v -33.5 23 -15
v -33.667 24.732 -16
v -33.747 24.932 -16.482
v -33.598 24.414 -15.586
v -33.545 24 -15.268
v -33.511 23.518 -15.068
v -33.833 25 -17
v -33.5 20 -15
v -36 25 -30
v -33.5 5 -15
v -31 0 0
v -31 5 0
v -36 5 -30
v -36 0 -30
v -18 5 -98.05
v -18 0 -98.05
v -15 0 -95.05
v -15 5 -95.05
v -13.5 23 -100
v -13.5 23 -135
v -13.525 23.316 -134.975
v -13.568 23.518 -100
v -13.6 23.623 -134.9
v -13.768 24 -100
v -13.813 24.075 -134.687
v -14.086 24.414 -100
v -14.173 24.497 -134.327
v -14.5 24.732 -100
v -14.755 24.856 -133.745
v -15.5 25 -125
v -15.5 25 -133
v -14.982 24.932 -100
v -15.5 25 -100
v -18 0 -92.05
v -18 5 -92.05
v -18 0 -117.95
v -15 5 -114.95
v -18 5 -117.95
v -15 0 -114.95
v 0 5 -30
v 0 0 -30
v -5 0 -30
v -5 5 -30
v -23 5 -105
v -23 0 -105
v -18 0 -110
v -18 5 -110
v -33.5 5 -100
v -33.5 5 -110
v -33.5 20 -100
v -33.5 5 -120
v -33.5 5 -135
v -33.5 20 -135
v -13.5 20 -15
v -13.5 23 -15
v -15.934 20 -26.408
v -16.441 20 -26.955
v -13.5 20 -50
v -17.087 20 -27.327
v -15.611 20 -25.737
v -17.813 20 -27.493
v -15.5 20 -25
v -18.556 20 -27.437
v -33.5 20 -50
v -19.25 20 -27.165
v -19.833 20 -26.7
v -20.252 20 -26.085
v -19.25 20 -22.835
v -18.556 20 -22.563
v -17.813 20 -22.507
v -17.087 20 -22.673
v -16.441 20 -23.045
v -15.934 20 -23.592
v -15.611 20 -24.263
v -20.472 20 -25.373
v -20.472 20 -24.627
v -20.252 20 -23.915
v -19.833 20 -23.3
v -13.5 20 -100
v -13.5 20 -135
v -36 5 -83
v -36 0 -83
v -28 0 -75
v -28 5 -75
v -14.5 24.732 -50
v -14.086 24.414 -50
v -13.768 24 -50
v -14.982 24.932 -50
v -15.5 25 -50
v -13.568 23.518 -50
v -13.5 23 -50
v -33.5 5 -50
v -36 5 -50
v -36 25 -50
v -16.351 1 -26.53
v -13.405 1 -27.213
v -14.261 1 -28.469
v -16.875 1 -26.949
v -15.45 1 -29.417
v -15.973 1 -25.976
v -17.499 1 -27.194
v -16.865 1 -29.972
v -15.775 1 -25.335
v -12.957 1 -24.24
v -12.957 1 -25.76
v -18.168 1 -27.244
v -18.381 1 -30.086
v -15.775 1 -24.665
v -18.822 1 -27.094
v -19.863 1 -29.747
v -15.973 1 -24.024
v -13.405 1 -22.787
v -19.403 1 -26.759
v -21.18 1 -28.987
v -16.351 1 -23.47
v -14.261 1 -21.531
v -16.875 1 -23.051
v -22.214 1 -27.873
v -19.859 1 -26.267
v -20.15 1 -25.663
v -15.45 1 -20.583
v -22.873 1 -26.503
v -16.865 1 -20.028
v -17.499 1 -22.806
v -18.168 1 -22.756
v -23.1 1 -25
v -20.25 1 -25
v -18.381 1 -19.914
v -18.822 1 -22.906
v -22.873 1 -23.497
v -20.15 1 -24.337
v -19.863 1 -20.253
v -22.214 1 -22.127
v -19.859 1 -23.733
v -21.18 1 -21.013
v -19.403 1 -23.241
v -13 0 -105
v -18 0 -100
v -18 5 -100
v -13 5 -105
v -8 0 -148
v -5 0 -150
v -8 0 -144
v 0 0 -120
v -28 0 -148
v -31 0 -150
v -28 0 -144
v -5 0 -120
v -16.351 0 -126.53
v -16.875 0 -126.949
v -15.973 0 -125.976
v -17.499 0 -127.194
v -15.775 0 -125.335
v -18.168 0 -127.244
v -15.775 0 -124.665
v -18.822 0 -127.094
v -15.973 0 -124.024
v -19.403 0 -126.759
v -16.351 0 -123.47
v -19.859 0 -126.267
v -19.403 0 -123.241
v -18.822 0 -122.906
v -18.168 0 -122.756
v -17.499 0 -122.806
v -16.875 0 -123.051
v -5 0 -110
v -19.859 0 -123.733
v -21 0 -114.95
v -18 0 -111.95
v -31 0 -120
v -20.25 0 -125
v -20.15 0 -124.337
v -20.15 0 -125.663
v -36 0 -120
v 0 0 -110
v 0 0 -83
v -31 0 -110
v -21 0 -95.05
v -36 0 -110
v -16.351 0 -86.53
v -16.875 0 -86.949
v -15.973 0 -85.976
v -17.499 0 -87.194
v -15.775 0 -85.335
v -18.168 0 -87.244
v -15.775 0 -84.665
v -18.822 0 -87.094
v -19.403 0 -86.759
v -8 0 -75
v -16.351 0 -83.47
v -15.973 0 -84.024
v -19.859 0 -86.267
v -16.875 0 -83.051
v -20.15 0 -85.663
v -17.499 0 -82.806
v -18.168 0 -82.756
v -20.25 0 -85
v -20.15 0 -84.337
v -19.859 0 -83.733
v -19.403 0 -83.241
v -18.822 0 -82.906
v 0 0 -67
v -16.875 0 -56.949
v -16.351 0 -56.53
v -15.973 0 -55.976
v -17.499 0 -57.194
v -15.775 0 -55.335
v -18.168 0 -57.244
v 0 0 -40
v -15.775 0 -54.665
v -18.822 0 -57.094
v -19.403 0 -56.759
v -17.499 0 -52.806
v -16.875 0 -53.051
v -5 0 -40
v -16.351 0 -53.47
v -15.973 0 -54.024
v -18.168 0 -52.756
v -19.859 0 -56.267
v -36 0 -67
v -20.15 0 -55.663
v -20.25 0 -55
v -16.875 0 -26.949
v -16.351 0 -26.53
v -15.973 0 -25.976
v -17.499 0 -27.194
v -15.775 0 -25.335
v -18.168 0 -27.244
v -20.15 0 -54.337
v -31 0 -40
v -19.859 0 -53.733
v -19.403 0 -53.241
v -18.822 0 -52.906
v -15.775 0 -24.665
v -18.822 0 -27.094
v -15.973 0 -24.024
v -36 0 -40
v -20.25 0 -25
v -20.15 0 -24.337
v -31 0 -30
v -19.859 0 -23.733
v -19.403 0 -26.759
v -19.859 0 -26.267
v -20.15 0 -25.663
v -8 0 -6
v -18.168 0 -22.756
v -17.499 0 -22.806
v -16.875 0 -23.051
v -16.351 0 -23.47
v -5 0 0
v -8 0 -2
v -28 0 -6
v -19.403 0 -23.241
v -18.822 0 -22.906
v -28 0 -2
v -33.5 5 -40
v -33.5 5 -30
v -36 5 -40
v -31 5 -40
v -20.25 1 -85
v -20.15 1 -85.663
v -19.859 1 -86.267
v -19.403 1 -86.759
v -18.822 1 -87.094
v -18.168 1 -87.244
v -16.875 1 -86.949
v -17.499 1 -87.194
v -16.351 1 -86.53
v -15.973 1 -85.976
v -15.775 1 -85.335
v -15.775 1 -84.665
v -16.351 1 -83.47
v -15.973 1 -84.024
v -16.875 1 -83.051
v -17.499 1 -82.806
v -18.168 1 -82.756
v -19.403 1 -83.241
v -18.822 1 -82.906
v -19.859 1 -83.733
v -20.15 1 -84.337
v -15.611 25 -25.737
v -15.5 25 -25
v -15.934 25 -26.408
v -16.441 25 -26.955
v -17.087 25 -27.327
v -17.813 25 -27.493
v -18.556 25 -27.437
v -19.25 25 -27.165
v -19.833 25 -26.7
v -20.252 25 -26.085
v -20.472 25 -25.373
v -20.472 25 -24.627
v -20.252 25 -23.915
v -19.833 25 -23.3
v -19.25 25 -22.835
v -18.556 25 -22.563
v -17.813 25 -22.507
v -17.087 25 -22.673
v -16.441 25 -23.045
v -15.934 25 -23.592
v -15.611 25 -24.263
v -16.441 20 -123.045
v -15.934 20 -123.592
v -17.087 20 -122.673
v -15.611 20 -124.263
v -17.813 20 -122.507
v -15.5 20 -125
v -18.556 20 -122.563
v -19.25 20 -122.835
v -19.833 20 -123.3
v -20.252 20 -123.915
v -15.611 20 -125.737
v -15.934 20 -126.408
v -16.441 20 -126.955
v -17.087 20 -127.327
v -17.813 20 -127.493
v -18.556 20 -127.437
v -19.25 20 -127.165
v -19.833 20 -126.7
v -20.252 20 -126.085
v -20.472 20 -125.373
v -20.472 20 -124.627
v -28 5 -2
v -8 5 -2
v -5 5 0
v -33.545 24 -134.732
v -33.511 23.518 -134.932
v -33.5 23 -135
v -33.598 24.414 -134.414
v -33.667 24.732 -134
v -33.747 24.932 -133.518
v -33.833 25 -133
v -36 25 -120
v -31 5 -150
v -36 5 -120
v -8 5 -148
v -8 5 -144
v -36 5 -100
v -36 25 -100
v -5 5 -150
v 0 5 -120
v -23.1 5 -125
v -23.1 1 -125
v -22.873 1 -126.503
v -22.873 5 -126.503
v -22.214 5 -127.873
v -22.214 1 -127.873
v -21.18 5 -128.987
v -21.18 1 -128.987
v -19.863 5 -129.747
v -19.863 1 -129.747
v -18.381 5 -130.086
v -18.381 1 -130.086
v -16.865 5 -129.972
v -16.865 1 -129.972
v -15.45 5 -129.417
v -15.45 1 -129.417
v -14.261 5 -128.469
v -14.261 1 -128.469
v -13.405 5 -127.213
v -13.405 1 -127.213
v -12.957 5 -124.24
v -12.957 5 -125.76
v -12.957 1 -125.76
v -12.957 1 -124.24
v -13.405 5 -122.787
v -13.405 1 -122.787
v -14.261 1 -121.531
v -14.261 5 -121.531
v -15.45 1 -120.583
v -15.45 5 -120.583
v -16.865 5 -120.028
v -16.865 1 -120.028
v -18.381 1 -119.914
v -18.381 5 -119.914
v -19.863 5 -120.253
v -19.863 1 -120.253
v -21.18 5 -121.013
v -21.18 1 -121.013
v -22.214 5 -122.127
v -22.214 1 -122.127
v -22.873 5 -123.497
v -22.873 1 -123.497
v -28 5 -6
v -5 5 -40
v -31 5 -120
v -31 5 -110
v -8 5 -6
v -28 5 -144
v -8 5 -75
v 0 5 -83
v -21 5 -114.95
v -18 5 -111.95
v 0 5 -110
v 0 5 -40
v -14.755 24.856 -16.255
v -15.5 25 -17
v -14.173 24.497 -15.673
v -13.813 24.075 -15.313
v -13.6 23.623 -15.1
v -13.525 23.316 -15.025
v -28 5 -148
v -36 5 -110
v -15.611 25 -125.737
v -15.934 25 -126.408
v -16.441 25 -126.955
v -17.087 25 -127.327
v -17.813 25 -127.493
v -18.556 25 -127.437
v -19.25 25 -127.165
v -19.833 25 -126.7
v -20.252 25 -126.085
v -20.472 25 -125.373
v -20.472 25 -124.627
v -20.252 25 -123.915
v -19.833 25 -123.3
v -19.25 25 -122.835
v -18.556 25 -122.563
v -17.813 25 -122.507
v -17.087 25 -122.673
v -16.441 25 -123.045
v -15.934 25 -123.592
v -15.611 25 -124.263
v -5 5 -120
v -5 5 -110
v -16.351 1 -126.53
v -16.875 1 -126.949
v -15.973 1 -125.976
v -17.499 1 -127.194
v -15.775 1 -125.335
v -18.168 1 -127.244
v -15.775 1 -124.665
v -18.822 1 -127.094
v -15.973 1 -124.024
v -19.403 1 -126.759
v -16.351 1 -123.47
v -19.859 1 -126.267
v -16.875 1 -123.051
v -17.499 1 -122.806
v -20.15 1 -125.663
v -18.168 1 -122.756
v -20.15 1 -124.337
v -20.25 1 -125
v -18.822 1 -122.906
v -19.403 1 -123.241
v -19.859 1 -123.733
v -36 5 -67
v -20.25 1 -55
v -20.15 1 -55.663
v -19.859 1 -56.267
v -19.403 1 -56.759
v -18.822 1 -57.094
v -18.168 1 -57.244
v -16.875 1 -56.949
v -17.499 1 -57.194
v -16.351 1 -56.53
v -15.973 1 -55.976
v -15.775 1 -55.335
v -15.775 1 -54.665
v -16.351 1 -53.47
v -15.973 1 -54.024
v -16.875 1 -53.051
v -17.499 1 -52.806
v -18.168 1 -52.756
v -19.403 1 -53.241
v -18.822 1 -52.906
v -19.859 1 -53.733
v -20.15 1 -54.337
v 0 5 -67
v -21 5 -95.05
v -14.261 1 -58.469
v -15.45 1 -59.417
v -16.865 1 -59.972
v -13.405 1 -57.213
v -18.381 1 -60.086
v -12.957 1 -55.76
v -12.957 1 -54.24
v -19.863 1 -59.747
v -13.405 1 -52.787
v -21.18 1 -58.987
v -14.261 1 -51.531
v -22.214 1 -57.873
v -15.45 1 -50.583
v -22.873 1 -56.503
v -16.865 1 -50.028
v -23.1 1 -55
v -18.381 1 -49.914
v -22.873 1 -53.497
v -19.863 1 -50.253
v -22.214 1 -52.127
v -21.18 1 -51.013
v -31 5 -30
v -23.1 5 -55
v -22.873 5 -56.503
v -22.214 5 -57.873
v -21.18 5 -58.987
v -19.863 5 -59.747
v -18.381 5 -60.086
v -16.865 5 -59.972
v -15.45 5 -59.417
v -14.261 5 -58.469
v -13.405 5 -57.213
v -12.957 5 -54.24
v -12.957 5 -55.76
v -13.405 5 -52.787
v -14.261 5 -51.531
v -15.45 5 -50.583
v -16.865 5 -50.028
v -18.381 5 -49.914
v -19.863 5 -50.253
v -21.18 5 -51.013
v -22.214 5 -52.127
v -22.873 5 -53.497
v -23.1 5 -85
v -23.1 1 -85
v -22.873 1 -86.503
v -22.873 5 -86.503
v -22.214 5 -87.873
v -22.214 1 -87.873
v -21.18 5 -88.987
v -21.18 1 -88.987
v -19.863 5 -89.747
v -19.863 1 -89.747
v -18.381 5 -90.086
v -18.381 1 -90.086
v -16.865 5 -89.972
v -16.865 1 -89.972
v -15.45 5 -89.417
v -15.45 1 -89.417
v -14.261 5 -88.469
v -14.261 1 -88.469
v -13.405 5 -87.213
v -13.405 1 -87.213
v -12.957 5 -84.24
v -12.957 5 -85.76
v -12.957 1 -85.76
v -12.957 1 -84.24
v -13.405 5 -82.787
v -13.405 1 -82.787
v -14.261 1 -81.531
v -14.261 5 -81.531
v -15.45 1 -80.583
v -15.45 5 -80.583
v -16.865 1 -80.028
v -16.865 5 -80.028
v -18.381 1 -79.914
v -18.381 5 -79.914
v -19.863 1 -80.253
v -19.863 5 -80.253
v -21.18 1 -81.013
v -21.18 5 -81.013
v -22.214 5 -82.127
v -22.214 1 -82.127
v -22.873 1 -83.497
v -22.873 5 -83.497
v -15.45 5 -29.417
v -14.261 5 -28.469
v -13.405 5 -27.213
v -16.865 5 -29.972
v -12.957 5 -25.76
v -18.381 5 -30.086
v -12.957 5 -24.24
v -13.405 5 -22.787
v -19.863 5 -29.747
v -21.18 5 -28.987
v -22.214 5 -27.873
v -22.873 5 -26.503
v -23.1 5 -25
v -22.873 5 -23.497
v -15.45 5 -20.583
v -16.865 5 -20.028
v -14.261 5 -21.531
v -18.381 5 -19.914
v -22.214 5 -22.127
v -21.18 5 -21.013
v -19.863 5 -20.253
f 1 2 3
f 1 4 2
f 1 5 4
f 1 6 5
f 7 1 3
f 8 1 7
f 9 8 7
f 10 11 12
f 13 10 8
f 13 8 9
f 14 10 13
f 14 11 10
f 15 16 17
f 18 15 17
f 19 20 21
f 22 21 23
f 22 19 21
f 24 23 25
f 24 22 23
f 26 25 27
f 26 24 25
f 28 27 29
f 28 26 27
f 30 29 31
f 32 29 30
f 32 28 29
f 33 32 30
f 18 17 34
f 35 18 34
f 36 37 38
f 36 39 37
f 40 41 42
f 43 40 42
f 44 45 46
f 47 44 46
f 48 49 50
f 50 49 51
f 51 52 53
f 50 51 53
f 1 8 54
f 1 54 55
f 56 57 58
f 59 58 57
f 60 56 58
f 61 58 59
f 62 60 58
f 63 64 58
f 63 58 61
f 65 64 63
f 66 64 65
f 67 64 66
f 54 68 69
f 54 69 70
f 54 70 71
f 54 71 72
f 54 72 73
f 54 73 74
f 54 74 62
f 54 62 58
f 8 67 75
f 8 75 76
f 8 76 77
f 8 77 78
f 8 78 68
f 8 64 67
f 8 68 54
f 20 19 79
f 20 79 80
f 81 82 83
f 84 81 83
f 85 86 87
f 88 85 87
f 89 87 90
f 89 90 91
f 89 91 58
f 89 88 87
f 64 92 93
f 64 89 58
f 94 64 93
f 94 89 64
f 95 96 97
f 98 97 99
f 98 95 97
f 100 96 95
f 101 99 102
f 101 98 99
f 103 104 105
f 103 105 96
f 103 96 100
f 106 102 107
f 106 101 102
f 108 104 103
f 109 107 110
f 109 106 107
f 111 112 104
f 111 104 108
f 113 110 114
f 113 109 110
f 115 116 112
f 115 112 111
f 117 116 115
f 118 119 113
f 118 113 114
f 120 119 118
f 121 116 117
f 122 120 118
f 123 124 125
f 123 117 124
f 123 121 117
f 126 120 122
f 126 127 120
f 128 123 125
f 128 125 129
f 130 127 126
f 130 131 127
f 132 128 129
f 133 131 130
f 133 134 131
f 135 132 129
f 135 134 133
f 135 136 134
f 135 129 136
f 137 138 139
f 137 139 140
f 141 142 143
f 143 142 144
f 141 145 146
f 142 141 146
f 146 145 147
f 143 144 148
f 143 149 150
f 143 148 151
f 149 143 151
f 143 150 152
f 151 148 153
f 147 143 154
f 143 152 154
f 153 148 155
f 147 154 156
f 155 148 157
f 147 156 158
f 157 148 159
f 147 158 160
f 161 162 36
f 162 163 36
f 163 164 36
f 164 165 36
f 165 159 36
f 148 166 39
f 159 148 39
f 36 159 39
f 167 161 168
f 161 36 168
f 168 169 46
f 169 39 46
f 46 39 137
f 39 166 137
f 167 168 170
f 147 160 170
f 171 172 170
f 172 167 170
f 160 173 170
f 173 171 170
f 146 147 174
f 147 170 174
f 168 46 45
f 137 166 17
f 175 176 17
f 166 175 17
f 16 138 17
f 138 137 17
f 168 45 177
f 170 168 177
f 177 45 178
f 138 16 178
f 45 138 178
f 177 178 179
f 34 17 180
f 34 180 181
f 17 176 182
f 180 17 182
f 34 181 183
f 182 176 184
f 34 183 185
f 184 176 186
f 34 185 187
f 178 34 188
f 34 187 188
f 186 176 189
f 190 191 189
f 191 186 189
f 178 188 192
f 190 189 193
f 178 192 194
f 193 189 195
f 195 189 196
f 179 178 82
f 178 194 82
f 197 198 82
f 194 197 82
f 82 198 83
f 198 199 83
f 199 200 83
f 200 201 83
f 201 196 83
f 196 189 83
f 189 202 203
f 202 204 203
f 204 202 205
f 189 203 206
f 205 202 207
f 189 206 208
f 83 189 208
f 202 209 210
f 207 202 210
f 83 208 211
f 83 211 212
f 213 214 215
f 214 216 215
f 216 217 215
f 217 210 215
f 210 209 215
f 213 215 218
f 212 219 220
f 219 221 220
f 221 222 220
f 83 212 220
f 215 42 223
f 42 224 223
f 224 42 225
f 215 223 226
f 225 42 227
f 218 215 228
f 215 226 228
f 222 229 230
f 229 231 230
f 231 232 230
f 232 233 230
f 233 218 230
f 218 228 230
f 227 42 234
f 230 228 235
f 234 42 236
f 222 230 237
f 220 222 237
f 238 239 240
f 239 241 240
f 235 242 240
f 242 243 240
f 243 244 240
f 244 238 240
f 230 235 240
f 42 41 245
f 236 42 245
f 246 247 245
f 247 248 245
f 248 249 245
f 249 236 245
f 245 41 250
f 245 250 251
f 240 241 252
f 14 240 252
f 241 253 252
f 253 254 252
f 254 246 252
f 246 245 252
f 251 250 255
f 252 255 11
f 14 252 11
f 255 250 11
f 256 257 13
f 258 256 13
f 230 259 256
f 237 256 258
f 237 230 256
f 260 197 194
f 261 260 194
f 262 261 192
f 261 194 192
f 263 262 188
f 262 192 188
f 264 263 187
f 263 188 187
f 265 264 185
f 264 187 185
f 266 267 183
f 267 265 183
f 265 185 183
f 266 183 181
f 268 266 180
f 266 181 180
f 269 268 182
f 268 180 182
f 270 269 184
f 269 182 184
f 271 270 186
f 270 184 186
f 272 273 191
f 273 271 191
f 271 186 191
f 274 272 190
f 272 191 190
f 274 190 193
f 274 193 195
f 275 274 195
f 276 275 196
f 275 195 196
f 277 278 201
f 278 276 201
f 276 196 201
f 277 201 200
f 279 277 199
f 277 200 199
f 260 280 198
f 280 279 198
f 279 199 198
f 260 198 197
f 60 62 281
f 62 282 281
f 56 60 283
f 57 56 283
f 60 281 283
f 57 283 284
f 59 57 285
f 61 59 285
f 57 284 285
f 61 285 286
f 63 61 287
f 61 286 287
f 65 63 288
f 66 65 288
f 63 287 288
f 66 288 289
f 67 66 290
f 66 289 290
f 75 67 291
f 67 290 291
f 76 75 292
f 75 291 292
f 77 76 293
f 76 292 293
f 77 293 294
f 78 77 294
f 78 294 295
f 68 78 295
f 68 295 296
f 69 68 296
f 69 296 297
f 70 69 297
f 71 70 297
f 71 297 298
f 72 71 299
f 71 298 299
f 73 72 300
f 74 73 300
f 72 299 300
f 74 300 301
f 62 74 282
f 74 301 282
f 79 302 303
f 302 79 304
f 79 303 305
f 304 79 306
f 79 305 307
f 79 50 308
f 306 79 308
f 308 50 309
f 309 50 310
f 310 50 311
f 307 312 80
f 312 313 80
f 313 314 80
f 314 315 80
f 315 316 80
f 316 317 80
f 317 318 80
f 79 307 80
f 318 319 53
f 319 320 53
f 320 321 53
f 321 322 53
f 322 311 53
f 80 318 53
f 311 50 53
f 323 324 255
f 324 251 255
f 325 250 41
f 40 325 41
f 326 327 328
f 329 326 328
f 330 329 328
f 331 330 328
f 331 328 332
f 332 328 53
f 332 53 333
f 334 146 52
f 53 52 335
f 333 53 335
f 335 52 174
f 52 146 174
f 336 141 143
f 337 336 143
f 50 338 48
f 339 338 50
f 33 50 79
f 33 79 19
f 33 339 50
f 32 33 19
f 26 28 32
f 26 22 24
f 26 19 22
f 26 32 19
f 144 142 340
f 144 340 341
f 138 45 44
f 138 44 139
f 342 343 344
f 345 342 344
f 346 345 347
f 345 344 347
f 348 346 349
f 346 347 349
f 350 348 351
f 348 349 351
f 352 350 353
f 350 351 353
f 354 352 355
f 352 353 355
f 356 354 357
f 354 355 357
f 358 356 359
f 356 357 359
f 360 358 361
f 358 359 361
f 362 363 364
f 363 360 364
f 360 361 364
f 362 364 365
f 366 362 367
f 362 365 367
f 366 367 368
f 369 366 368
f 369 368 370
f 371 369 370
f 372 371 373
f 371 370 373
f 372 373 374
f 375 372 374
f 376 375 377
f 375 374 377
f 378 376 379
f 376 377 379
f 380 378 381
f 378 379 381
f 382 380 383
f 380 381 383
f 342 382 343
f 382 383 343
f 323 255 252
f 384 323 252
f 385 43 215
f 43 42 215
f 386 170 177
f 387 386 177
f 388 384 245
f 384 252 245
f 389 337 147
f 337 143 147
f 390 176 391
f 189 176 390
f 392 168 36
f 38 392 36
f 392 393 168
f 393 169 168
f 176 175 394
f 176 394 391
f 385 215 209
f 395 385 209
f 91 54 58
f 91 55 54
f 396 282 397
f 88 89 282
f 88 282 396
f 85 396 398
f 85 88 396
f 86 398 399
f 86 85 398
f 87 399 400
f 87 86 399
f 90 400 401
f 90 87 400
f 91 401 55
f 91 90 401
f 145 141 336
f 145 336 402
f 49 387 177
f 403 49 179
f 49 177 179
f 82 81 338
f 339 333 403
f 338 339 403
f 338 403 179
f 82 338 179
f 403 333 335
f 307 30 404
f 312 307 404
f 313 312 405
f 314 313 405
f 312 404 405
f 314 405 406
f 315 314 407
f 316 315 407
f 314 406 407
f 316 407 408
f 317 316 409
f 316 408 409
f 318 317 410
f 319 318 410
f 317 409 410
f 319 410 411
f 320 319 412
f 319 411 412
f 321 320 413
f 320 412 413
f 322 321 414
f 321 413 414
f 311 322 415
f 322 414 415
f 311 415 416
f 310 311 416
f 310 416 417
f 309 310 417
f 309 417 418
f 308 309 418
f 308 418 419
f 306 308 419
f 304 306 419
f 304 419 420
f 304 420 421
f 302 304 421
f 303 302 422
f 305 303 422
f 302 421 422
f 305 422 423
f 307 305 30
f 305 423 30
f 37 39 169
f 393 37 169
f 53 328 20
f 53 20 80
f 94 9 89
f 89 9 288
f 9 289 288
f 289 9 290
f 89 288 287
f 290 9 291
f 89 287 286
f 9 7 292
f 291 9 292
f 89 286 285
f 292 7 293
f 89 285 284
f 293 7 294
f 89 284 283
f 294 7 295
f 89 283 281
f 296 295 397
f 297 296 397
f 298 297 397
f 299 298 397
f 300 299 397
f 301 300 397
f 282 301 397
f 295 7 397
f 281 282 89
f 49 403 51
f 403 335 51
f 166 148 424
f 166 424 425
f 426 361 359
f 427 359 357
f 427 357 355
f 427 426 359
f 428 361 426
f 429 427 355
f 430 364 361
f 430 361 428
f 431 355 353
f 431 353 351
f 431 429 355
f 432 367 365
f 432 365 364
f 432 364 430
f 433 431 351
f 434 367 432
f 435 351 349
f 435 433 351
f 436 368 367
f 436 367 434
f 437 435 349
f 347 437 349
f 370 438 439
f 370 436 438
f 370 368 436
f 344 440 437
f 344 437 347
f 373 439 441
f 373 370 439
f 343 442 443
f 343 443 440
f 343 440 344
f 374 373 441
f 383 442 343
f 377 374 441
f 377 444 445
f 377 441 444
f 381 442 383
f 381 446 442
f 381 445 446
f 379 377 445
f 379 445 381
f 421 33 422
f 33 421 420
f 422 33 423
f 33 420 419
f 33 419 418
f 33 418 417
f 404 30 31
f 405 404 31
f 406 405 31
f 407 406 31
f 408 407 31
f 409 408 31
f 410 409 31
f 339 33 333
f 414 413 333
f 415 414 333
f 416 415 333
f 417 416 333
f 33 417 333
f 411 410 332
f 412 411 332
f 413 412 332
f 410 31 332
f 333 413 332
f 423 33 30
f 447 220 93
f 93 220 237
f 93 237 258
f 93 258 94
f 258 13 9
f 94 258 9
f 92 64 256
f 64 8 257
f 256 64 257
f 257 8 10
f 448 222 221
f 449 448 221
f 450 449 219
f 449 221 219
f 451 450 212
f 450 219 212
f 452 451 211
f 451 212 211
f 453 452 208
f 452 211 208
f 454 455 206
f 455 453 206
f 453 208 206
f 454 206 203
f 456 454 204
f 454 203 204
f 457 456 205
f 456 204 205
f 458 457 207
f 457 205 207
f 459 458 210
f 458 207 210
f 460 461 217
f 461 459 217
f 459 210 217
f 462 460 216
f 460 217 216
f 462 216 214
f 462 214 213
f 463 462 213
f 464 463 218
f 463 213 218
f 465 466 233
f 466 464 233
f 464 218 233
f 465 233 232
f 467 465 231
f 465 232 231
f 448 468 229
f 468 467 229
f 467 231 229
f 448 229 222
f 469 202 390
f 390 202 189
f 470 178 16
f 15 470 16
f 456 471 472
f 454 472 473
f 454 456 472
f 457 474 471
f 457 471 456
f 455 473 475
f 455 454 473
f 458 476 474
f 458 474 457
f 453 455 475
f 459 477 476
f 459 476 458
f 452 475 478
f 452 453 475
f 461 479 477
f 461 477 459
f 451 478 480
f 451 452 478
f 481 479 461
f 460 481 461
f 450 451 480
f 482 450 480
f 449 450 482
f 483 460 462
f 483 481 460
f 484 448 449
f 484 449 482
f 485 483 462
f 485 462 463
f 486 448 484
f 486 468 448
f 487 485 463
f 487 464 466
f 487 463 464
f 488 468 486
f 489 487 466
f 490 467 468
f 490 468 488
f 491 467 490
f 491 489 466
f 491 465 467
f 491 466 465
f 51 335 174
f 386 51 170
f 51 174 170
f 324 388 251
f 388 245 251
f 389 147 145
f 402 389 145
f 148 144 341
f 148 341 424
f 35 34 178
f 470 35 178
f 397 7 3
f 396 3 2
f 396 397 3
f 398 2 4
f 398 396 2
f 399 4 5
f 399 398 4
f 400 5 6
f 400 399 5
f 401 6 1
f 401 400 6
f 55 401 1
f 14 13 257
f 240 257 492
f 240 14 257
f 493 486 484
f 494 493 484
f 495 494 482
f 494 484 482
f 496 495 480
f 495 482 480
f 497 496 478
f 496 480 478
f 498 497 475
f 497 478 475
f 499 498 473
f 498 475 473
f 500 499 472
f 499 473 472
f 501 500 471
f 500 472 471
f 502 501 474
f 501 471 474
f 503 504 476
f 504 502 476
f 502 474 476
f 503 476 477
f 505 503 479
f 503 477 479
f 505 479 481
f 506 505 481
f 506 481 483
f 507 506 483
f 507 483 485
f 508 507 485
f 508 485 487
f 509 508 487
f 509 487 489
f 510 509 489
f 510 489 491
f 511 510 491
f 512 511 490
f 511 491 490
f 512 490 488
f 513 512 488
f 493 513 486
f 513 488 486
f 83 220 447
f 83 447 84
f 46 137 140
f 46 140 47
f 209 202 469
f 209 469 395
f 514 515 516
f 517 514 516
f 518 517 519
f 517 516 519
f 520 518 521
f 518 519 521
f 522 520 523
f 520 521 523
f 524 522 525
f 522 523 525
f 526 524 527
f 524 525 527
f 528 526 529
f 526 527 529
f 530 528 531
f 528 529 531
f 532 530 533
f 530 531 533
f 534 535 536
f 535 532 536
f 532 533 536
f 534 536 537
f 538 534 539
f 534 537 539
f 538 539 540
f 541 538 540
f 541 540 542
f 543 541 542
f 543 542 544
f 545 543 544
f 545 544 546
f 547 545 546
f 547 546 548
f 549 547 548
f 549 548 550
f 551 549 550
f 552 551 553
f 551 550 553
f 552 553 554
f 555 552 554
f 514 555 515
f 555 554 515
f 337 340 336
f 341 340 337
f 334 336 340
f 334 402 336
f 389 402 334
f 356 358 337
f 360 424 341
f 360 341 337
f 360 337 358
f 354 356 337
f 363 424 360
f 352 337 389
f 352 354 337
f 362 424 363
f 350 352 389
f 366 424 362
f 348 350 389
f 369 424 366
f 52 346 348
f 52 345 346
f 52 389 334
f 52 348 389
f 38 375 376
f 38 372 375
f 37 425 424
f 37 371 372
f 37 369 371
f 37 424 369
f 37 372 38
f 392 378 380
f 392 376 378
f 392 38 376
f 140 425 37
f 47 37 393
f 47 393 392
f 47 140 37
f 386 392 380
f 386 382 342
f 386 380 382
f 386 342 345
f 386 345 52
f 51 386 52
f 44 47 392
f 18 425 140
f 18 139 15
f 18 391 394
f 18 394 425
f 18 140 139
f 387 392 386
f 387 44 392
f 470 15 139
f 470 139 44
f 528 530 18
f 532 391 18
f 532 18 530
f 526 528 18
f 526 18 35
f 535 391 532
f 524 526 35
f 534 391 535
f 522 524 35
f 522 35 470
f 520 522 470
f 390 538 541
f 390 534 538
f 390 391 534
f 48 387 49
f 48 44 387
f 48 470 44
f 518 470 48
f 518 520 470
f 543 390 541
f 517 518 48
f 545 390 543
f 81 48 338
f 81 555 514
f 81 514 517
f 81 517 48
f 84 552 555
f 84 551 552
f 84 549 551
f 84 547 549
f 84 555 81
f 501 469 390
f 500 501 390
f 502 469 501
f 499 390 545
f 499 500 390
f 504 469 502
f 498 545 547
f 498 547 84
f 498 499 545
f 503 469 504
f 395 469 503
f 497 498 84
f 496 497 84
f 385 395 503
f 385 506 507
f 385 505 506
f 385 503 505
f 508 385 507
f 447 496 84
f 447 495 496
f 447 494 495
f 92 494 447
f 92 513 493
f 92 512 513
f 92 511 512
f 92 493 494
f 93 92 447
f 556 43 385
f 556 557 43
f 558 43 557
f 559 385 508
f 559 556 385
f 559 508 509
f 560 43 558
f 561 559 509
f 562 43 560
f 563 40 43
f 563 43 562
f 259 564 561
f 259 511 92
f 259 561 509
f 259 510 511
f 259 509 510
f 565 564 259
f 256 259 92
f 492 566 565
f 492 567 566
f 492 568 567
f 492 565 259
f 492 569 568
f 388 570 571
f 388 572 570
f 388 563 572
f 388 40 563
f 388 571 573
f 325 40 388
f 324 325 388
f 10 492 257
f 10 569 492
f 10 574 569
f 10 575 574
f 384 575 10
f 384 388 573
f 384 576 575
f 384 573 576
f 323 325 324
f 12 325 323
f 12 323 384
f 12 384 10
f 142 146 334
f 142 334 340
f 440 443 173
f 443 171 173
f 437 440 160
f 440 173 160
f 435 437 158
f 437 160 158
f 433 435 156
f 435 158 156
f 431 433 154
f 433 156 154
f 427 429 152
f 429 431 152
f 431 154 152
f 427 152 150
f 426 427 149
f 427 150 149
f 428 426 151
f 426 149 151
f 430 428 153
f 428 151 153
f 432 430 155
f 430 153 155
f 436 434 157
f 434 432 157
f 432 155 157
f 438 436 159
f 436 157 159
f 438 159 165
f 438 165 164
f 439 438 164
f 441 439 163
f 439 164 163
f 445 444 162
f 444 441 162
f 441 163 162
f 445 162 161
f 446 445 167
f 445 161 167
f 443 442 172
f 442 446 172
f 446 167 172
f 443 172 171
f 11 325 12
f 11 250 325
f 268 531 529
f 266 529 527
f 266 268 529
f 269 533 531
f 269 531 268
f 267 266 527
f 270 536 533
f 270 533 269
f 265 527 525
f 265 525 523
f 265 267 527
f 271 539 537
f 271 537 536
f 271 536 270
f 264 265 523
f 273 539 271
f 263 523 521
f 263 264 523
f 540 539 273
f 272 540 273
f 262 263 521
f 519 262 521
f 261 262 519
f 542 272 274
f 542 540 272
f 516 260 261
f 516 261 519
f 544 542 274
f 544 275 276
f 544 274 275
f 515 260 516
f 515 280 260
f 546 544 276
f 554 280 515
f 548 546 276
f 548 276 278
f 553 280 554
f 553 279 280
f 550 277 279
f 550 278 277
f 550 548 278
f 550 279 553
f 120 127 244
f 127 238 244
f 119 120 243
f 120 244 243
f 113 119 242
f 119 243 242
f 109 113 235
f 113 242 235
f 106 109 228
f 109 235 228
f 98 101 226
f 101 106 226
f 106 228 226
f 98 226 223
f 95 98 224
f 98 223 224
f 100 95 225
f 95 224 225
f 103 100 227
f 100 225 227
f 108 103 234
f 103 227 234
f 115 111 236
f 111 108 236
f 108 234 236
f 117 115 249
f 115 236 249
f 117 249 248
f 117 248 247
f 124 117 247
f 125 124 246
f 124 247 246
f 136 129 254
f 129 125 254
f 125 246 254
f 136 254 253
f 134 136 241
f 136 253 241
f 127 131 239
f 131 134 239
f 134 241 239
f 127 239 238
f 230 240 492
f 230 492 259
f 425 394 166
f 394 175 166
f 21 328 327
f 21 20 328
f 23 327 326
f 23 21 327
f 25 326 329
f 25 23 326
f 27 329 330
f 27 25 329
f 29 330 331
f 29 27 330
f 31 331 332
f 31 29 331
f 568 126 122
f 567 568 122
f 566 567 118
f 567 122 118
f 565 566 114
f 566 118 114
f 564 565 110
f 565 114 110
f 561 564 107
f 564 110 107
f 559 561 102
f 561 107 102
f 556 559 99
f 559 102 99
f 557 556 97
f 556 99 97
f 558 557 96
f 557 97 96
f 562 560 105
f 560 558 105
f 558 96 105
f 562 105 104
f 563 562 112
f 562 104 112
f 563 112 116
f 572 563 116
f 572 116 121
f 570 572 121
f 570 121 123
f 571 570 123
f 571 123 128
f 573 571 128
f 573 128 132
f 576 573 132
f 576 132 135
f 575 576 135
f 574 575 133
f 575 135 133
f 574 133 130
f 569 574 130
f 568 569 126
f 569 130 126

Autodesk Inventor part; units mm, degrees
ref_plane "YZ Plane" through (0, 0, 0) normal (1, 0, 0) x (0, 1, 0)
ref_plane "XZ Plane" through (0, 0, 0) normal (0, 1, 0) x (-1, 0, 0)
ref_plane "XY Plane" through (0, 0, 0) normal (0, 0, 1) x (1, 0, 0)
sketch "Sketch1" plane through (0, 0, 0) normal (0, 1, 0) x (-1, 0, 0)
  line L0 (5, 0) -> (31, 0)
  line L1 (36, -30) -> (36, -120)
  line L2 (31, -150) -> (5, -150)
  line L3 (0, -120) -> (0, -30)
  circle A0 centre (18, -25) radius 5.1
  circle A1 centre (18, -55) radius 5.1
  circle A2 centre (18, -85) radius 5.1
  circle A3 centre (18, -125) radius 5.1
  line L4 (36, -30) -> (31, -30)
  line L5 (31, -30) -> (31, -40)
  line L6 (31, -40) -> (36, -40)
  line L7 (36, -120) -> (31, -120)
  line L8 (31, -120) -> (31, -110)
  line L9 (31, -110) -> (36, -110)
  line L10 (0, -30) -> (5, -30)
  line L11 (5, -30) -> (5, -40)
  line L12 (5, -40) -> (0, -40)
  line L13 (0, -120) -> (5, -120)
  line L14 (5, -120) -> (5, -110)
  line L15 (0, -110) -> (5, -110)
  circle A4 centre (18, -25) radius 2.25
  circle A5 centre (18, -55) radius 2.25
  circle A6 centre (18, -85) radius 2.25
  circle A7 centre (18, -125) radius 2.25
  line L16 (5, 0) -> (0, -30)
  line L17 (31, -150) -> (36, -120)
  line L18 (5, -150) -> (0, -120)
  line L19 (31, 0) -> (36, -30)
  line L20 (18, -100) -> (13, -105)
  line L21 (13, -105) -> (18, -110)
  line L22 (23, -105) -> (18, -110)
  line L23 (23, -105) -> (18, -100)
  line L24 (21, -114.95) -> (18, -117.95)
  line L25 (15, -114.95) -> (18, -117.95)
  line L26 (15, -114.95) -> (18, -111.95)
  line L27 (18, -111.95) -> (21, -114.95)
  line L28 (21, -95.05) -> (18, -98.05)
  line L29 (18, -98.05) -> (15, -95.05)
  line L30 (15, -95.05) -> (18, -92.05)
  line L31 (18, -92.05) -> (21, -95.05)
  line L32 (31, -150) -> (28, -150)
  line L33 (5, -150) -> (8, -150)
  line L34 (8, -148) -> (28, -148)
  line L35 (8, -148) -> (8, -144)
  line L36 (8, -144) -> (28, -144)
  line L37 (28, -144) -> (28, -148)
  line L38 (31, 0) -> (28, 0)
  line L39 (5, 0) -> (8, 0)
  line L40 (8, -2) -> (28, -2)
  line L41 (28, -2) -> (28, -6)
  line L42 (28, -6) -> (8, -6)
  line L43 (8, -6) -> (8, -2)
  line L44 (36, -75) -> (36, -83)
  line L45 (36, -75) -> (36, -67)
  line L46 (36, -67) -> (28, -75)
  line L47 (36, -83) -> (28, -75)
  line L48 (0, -75) -> (0, -83)
  line L49 (0, -75) -> (0, -67)
  line L50 (0, -67) -> (8, -75)
  line L51 (0, -83) -> (8, -75)
  point P0 (0, 0)
  point P1 (18, 0)
  point P2 (18, -150)
  dimension "d2" = 10.2
  dimension "d3" = 25
  dimension "d4" = 10.2
  dimension "d5" = 30
  dimension "d6" = 10.2
  dimension "d7" = 30
  dimension "d8" = 10.2
  dimension "d9" = 40
  dimension "d10" = 25
  dimension "d12" = 5
  dimension "d13" = 10
  dimension "d15" = 10
  dimension "d17" = 5
  dimension "d19" = 5
  dimension "d22" = 4.5
  dimension "d23" = 4.5
  dimension "d24" = 4.5
  dimension "d25" = 4.5
  dimension "d38" = 3
  dimension "d39" = 2
  dimension "d41" = 2
  dimension "d42" = 4
  dimension "d44" = 2
  dimension "d45" = 3
  dimension "d46" = 4
  dimension "d50" = 8
  dimension "d51" = 8
extrude "Extrusion1" add sketch "Sketch1" along normal blind 5 contours L0 L19 L4 L5 L6 L1 L46 L47 L9 L8 L7 L17 L2 L18 L13 L14 L15 L3 L51 L50 L12 L11 L10 L16
extrude "Extrusion2" add sketch "Sketch1" along normal blind 1 contours A0 | A1 | A2 | A3
sketch "Sketch2" plane through (0, 5, 0) normal (0, 1, 0) x (1, 0, 0)
  line L0 (-36, 120) -> (-31, 120) projected
  line L1 (-33.5, 120) -> (-33.5, 135)
  line L2 (-31, 150) -> (-36, 120) projected
  line L3 (-33.5, 120) -> (-35.9995, 120)
  line L4 (-35.9995, 120) -> (-33.5, 135)
  line L5 (-31, 30) -> (-36, 30) projected
  line L6 (-33.5, 30) -> (-33.5, 15)
  line L7 (-36, 30) -> (-31, 0) projected
  line L8 (-33.5, 15) -> (-36, 30)
  line L9 (-36, 30) -> (-33.5, 30)
  point P0 (0, 0)
  dimension "d52" = 15
extrude "Extrusion3" add sketch "Sketch2" along normal blind 20
sketch "Sketch3" plane through (-36, 0, -120) normal (0, 0, 1) x (1, 0, 0)
  line L0 (2.5, 5) -> (2.5, 25) projected
  line L1 (0, 0) -> (0, 5) projected
  line L2 (2.5, 25) -> (0, 25)
  line L3 (0, 25) -> (0, 5)
  line L4 (0, 5) -> (2.5, 5)
  line L5 (2.5, 5) -> (2.5, 25)
  point P0 (36, 0)
extrude "Extrusion4" add sketch "Sketch3" along normal blind 20
sketch "Sketch4" plane through (-31, 0, -30) normal (0, 0, -1) x (-1, 0, 0)
  line L0 (5, 0) -> (5, 25) projected
  line L1 (2.5, 5) -> (5, 5)
  line L2 (5, 5) -> (5, 25)
  line L3 (5, 25) -> (2.5, 25)
  line L4 (2.5, 25) -> (2.5, 5)
  point P0 (-31, 0)
extrude "Extrusion5" add sketch "Sketch4" along normal blind 20
sketch "Sketch5" plane through (-33.5, 5, -135) normal (1, 0, 0) x (0, 0, -1)
  line L0 (0, 20) -> (-35, 20) projected
  line L1 (0, 20) -> (0, 10)
  line L2 (0, 0) -> (0, 20) projected
  line L3 (-35, 0) -> (-35, 20) projected
  line L4 (-35, 10) -> (-35, 20)
  line L5 (-35, 20) -> (0, 20)
  line L6 (-85, 20) -> (-85, 0) projected
  line L7 (-120, 20) -> (-85, 20) projected
  line L8 (-85, 10) -> (-120, 10)
  line L9 (-120, 10) -> (-120, 20)
  line L10 (-120, 20) -> (-85, 20)
  line L11 (-85, 20) -> (-85, 10)
  line L12 (0, 10) -> (-35, 10)
  line L13 (-35, 10) -> (-35, 20)
  line L14 (-35, 20) -> (0, 20)
  line L15 (0, 20) -> (0, 10)
  line L16 (0, 0) -> (-35, 0)
  line L17 (-35, 0) -> (-35, 15)
  line L18 (-35, 15) -> (0, 15)
  line L19 (0, 15) -> (0, 0)
  line L20 (-35, 15) -> (0, 15)
  line L21 (0, 15) -> (0, 20)
  line L22 (0, 20) -> (-35, 20)
  line L23 (-35, 20) -> (-35, 15)
  line L24 (-85, 15) -> (-120, 15)
  line L25 (-120, 15) -> (-120, 20)
  line L26 (-120, 20) -> (-85, 20)
  line L27 (-85, 20) -> (-85, 15)
  point P0 (-135, -5)
extrude "Extrusion6" add sketch "Sketch5" along normal blind 20 contours L1 L18 L3 L0 | L6 L24 L9 L7
fillet "Fillet1" radius 2 4 edges at (-13.5, 25, -117.5) (-13.5, 25, -32.5) (-23.5, 25, -15) (-23.5, 25, -135)
sketch "Sketch6" plane through (0, 25, 0) normal (0, 1, 0) x (1, 0, 0)
  circle A0 centre (-18, 125) radius 2.25 projected
  circle A1 centre (-18, 125) radius 2.25
  circle A2 centre (-18, 25) radius 2.25 projected
  circle A3 centre (-18, 25) radius 2.25
  circle A4 centre (-18, 125) radius 2.5
  circle A5 centre (-18, 25) radius 2.5
  point P0 (0, 0)
  dimension "d62" = 5
  dimension "d63" = 5
extrude "Extrusion7" cut sketch "Sketch6" against normal blind 20 contours A0 | A2 | A4 | A5
properties part number "SideV1"
